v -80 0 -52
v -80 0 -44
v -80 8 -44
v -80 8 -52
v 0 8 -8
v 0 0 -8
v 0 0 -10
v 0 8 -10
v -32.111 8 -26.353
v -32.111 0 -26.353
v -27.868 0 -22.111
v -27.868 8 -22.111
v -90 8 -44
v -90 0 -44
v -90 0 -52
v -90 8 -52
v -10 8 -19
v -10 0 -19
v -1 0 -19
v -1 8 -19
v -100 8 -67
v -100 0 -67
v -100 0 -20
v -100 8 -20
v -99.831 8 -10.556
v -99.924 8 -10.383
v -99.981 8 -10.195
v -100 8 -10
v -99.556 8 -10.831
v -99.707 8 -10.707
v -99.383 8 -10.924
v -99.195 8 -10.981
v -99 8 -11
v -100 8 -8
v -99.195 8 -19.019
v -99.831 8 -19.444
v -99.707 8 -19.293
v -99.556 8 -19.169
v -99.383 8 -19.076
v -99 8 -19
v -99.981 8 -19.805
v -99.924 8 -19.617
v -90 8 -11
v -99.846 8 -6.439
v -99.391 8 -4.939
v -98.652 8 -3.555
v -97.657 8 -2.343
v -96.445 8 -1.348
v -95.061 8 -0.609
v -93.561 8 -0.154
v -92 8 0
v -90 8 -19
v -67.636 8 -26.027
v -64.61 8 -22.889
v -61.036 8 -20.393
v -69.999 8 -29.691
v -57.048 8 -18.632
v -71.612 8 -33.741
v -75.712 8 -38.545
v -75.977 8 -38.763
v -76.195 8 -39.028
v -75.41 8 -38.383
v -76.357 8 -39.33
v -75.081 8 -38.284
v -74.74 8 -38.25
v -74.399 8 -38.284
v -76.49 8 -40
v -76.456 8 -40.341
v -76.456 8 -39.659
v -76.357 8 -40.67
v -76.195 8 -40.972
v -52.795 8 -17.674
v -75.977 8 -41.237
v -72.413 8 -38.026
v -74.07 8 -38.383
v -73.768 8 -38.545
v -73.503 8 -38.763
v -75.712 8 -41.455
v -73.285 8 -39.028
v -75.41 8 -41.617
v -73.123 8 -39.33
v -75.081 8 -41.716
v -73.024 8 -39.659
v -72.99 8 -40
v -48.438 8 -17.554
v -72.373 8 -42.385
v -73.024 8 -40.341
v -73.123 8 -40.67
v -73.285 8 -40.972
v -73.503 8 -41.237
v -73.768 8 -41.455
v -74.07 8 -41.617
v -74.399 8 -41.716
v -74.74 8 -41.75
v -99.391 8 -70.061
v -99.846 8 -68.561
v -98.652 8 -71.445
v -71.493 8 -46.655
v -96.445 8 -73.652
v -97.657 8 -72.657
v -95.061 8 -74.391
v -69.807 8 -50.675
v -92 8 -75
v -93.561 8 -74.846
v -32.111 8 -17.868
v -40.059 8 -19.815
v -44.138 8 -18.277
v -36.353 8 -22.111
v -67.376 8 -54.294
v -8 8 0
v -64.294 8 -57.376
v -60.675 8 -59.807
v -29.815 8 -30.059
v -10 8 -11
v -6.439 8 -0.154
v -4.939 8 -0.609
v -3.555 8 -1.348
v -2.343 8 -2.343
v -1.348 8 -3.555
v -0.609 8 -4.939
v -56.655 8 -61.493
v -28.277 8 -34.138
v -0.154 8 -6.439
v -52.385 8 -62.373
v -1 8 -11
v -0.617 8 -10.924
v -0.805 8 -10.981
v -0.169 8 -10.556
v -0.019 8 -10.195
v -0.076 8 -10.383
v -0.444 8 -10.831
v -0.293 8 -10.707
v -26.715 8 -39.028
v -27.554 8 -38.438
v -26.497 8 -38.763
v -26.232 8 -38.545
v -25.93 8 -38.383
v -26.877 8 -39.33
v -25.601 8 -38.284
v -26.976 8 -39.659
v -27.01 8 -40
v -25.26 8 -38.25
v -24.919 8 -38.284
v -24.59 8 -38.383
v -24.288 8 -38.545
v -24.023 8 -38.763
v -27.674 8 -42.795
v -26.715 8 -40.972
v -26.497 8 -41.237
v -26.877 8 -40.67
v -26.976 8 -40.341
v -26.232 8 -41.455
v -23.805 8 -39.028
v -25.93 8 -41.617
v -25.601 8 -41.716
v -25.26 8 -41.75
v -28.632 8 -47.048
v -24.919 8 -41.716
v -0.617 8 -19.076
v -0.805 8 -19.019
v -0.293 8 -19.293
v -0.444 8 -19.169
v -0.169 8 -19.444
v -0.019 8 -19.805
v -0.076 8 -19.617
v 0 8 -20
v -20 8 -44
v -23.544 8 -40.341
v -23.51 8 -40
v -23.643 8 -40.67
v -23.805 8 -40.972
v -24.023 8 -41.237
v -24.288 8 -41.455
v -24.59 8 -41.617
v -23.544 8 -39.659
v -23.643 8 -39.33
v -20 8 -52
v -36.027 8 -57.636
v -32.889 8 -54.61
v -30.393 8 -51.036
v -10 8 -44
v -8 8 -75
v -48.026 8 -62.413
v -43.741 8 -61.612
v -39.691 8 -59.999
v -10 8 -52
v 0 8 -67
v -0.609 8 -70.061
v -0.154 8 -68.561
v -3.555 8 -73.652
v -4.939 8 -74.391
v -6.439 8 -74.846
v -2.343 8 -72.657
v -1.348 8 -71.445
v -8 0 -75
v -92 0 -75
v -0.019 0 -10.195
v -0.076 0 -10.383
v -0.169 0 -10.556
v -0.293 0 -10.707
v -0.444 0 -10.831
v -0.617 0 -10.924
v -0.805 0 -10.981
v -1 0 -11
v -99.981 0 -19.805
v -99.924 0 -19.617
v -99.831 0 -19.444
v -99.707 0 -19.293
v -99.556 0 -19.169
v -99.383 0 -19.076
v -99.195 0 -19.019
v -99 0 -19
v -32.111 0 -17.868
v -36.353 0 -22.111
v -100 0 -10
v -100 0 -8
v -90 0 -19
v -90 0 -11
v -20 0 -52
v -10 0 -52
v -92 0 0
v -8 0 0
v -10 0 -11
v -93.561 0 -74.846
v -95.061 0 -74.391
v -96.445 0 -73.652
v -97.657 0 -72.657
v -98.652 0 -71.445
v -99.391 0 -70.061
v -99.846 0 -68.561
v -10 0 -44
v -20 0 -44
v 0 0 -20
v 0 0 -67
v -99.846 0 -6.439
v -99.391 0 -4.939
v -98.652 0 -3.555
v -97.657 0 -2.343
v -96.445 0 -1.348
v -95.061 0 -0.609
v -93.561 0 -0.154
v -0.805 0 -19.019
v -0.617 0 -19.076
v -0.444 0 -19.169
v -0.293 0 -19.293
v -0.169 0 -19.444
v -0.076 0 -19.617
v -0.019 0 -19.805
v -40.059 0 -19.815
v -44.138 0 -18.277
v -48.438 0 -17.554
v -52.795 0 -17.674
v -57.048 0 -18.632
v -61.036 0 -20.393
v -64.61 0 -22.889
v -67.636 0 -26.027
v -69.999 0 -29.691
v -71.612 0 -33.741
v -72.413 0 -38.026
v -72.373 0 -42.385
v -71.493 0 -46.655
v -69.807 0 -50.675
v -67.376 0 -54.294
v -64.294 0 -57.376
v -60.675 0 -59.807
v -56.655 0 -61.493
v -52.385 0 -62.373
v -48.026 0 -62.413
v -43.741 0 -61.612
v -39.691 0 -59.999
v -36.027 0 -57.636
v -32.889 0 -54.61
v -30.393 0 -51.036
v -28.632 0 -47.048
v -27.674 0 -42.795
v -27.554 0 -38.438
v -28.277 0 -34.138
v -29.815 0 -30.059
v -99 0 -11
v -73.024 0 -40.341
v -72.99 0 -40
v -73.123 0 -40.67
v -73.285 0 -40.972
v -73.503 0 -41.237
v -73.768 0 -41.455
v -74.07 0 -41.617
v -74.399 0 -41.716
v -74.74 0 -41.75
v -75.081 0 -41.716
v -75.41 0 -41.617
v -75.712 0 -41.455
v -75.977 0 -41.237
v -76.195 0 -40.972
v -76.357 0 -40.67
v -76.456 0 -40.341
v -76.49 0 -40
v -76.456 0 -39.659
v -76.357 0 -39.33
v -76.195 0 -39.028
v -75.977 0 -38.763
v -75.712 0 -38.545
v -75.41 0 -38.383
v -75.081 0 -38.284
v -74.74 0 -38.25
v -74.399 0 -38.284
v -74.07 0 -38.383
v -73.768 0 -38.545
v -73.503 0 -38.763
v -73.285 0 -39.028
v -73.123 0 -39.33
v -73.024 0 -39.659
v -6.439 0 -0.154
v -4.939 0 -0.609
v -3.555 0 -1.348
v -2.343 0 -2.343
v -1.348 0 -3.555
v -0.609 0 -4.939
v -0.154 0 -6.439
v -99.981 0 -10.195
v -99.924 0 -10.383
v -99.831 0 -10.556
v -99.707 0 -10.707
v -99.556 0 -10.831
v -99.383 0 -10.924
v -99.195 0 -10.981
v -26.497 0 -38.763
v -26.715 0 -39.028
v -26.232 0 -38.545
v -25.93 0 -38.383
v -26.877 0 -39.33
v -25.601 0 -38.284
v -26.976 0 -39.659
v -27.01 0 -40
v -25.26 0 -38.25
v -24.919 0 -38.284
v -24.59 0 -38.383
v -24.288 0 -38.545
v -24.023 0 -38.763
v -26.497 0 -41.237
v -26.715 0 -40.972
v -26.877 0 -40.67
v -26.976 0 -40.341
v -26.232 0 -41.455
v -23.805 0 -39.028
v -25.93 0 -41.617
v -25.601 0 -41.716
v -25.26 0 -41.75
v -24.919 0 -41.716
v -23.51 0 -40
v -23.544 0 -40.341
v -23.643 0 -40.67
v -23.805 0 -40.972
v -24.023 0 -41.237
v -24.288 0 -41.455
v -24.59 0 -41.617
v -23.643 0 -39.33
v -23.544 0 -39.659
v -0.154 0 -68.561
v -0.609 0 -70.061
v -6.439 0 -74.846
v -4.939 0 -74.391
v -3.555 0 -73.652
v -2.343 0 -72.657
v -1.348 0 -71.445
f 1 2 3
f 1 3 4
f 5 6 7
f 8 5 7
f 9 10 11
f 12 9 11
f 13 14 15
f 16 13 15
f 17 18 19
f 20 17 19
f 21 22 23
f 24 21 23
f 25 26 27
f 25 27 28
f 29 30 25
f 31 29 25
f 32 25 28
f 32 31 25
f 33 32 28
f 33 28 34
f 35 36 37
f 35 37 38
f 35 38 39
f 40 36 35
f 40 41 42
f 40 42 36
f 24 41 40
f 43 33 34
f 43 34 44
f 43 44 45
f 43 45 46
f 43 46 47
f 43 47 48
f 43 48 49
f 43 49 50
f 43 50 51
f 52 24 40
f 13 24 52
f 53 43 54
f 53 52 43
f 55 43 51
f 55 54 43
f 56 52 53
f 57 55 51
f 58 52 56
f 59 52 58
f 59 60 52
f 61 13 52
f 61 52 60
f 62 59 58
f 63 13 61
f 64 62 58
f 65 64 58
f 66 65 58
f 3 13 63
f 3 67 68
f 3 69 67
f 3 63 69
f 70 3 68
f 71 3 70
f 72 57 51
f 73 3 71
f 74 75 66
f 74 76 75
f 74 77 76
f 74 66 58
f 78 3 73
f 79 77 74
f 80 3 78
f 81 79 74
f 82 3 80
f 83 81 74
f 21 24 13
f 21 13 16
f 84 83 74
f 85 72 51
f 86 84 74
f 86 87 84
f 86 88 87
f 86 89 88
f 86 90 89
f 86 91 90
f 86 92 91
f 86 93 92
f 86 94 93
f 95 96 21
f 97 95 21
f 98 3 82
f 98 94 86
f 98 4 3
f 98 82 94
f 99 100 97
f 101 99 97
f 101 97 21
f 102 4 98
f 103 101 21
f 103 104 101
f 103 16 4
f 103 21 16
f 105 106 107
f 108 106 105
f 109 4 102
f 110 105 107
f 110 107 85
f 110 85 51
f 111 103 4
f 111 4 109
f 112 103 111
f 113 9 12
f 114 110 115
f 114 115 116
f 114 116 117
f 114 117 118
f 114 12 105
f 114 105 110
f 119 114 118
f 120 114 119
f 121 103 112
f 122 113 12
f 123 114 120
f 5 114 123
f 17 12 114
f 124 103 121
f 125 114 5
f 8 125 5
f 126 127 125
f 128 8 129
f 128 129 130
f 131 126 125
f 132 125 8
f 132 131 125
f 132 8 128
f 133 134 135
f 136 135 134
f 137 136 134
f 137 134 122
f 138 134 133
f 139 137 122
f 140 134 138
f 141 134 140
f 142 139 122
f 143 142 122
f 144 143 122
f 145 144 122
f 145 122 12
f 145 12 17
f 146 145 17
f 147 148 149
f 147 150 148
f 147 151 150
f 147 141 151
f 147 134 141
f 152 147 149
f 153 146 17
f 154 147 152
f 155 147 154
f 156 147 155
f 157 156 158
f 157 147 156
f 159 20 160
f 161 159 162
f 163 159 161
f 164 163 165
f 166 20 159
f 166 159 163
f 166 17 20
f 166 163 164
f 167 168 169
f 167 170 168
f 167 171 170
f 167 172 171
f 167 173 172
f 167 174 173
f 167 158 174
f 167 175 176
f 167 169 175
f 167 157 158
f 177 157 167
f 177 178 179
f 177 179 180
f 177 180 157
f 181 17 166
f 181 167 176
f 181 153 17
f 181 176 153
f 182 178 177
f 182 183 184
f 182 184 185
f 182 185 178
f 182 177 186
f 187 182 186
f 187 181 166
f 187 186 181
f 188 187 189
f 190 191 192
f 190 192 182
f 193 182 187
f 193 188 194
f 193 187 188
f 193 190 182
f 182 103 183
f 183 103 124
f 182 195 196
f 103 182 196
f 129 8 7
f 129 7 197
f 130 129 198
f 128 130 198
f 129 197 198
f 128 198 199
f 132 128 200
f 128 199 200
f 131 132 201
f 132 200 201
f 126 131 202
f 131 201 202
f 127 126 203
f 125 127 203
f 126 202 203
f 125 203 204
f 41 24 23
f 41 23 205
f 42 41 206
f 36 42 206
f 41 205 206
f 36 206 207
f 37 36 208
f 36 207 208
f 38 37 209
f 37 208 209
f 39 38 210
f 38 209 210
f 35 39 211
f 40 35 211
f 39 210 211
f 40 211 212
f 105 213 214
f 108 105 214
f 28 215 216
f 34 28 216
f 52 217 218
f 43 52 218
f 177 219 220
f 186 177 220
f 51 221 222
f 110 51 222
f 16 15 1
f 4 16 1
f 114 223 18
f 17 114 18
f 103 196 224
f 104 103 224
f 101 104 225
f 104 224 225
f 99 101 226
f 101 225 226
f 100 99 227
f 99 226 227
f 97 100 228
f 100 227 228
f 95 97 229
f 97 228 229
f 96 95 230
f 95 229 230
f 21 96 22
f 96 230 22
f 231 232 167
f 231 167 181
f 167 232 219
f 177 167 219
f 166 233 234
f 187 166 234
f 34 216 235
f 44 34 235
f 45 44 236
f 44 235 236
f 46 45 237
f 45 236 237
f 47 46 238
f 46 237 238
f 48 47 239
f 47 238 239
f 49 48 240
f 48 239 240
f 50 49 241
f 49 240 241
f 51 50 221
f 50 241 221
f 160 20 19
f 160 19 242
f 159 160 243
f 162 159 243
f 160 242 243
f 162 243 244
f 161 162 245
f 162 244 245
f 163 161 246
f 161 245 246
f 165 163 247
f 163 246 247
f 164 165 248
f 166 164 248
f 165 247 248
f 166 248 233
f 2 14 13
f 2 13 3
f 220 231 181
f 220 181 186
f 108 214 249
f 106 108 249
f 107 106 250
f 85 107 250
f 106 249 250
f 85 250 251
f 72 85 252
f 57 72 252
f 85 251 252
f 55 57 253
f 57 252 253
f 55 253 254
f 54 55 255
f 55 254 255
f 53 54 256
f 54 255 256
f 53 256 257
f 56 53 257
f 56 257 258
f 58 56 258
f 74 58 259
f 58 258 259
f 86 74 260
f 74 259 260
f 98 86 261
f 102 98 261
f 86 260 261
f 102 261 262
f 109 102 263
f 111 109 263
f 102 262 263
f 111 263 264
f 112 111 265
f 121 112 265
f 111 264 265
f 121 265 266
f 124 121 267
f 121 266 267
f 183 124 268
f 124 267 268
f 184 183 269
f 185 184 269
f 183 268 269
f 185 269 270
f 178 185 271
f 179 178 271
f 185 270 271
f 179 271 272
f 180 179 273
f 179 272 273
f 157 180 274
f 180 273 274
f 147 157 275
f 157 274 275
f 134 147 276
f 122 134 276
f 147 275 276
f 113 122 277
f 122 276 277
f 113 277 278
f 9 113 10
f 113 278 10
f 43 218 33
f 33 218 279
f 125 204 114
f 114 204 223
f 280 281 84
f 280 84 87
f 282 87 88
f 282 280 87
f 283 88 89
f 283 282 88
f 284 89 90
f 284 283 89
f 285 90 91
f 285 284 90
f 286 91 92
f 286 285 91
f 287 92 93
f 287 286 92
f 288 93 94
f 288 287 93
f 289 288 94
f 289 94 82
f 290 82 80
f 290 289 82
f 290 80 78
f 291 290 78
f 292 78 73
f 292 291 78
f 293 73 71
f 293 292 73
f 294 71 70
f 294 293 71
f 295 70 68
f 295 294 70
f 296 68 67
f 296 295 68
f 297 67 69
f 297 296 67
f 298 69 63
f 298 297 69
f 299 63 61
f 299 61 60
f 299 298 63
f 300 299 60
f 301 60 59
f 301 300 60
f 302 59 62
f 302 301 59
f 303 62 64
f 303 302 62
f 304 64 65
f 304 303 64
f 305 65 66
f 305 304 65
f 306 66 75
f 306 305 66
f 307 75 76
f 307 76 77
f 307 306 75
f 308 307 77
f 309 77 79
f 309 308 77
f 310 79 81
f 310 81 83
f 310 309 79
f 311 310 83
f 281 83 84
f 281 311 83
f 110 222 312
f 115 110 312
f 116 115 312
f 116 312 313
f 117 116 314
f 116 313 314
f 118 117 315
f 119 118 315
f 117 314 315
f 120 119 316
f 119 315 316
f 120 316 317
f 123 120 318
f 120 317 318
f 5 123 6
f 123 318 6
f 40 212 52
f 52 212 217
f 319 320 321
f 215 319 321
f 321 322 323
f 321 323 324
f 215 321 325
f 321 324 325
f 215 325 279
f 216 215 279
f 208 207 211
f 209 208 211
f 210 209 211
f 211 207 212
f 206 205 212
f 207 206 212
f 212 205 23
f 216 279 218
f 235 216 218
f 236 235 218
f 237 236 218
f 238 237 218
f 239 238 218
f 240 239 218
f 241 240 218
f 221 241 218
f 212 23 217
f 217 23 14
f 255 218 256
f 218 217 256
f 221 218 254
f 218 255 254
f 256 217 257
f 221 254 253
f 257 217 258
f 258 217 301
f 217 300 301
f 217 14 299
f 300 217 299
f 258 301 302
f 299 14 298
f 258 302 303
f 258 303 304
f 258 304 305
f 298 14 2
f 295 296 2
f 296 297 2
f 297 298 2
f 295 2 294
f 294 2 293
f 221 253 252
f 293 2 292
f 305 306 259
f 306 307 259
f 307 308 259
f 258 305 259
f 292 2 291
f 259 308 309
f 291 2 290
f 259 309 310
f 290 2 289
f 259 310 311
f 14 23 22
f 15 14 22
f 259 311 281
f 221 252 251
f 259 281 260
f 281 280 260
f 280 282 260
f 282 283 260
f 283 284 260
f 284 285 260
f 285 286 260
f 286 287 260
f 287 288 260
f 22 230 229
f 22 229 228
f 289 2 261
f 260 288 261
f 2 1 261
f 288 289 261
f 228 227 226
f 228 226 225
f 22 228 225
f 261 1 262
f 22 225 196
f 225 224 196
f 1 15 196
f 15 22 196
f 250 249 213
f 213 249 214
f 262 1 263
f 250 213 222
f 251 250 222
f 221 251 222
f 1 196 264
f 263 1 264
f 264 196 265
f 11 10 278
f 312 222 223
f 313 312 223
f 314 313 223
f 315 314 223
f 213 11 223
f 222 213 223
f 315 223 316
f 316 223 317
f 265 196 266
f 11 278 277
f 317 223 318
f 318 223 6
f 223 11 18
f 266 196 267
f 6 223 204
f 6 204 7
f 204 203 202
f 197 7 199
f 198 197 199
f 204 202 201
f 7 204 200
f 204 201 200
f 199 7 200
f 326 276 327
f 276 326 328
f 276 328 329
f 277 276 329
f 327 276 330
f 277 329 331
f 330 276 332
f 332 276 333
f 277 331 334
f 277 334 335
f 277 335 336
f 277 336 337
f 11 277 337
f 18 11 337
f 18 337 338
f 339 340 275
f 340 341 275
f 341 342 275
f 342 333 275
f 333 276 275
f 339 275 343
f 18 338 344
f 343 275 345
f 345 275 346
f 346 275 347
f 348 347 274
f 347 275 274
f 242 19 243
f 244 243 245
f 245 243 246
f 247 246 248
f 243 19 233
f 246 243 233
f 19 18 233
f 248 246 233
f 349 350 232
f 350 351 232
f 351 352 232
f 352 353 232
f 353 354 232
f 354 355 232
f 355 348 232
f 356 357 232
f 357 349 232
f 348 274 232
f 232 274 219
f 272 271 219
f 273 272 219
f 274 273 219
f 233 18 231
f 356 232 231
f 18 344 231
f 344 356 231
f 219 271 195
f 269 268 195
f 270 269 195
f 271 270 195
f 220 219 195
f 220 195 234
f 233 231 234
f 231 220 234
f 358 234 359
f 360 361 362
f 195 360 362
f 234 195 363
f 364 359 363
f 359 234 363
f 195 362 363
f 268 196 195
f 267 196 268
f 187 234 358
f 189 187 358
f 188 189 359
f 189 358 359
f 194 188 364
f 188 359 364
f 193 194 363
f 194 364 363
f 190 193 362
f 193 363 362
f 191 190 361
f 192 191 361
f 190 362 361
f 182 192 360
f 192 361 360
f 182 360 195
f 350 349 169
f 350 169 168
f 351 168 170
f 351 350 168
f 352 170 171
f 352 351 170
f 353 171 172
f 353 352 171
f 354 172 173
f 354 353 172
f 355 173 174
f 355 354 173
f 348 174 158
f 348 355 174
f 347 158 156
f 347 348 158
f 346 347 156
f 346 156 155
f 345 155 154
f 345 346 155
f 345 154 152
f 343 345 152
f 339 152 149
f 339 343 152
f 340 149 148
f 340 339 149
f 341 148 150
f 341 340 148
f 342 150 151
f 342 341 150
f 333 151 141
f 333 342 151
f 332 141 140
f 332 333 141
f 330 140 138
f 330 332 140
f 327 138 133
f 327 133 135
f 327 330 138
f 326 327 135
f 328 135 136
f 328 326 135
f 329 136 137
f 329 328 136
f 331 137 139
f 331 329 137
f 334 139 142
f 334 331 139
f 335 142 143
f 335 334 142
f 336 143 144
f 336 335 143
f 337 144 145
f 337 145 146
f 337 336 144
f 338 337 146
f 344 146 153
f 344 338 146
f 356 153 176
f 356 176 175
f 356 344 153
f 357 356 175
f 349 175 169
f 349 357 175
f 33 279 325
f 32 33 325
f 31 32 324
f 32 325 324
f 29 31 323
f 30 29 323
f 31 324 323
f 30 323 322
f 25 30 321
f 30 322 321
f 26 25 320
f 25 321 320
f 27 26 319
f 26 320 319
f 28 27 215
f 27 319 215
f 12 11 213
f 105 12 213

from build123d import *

# Parameters (mm, degrees)
SKETCH1_W           = 10
SKETCH1_H           = 8
SKETCH1_R           = 1.75
BOSS_EXTRUDE2_DEPTH = 8


with BuildPart() as part:
    # Sketch1 → Boss-Extrude2 (new body)
    with BuildSketch(Plane(origin=(0, 0, 0), x_dir=(1, 0, 0), z_dir=(0, 1, 0))):
        with BuildLine():
            Line((-92, 0), (-8, 0))
            ThreePointArc((-8, 0), (-2.343145751, 2.343145751), (0, 8))
            Line((0, 8), (0, 10))
            ThreePointArc((0, 10), (-0.292893219, 10.707106781), (-1, 11))
            Line((-1, 11), (-10, 11))
            Line((-10, 11), (-10, 19))
            Line((-10, 19), (-1, 19))
            ThreePointArc((-1, 19), (-0.292893219, 19.292893219), (0, 20))
            Line((0, 20), (0, 67))
            ThreePointArc((0, 67), (-2.343145751, 72.656854249), (-8, 75))
            Line((-8, 75), (-92, 75))
            ThreePointArc((-92, 75), (-97.656854249, 72.656854249), (-100, 67))
            Line((-100, 67), (-100, 20))
            ThreePointArc((-100, 20), (-99.707106781, 19.292893219), (-99, 19))
            Line((-99, 19), (-90, 19))
            Line((-90, 19), (-90, 11))
            Line((-90, 11), (-99, 11))
            ThreePointArc((-99, 11), (-99.707106781, 10.707106781), (-100, 10))
            Line((-100, 10), (-100, 8))
            ThreePointArc((-100, 8), (-97.656854249, 2.343145751), (-92, 0))
        make_face()
        with Locations((-85, 48)):
            Rectangle(SKETCH1_W, SKETCH1_H, mode=Mode.SUBTRACT)
        with Locations((-15, 48)):
            Rectangle(SKETCH1_W, SKETCH1_H, mode=Mode.SUBTRACT)
        with Locations((-74.74, 40)):
            Circle(SKETCH1_R, mode=Mode.SUBTRACT)
        with BuildLine():
            Line((-32.110832625, 17.868191938), (-36.353473312, 22.110832625))
            ThreePointArc((-36.353473312, 22.110832625), (-65.909902577, 55.909902577), (-32.110832625, 26.353473312))
            Line((-32.110832625, 26.353473312), (-27.868191938, 22.110832625))
            Line((-27.868191938, 22.110832625), (-32.110832625, 17.868191938))
        make_face(mode=Mode.SUBTRACT)
        with Locations((-25.26, 40)):
            Circle(SKETCH1_R, mode=Mode.SUBTRACT)
    extrude(amount=BOSS_EXTRUDE2_DEPTH)


solid = part.part
